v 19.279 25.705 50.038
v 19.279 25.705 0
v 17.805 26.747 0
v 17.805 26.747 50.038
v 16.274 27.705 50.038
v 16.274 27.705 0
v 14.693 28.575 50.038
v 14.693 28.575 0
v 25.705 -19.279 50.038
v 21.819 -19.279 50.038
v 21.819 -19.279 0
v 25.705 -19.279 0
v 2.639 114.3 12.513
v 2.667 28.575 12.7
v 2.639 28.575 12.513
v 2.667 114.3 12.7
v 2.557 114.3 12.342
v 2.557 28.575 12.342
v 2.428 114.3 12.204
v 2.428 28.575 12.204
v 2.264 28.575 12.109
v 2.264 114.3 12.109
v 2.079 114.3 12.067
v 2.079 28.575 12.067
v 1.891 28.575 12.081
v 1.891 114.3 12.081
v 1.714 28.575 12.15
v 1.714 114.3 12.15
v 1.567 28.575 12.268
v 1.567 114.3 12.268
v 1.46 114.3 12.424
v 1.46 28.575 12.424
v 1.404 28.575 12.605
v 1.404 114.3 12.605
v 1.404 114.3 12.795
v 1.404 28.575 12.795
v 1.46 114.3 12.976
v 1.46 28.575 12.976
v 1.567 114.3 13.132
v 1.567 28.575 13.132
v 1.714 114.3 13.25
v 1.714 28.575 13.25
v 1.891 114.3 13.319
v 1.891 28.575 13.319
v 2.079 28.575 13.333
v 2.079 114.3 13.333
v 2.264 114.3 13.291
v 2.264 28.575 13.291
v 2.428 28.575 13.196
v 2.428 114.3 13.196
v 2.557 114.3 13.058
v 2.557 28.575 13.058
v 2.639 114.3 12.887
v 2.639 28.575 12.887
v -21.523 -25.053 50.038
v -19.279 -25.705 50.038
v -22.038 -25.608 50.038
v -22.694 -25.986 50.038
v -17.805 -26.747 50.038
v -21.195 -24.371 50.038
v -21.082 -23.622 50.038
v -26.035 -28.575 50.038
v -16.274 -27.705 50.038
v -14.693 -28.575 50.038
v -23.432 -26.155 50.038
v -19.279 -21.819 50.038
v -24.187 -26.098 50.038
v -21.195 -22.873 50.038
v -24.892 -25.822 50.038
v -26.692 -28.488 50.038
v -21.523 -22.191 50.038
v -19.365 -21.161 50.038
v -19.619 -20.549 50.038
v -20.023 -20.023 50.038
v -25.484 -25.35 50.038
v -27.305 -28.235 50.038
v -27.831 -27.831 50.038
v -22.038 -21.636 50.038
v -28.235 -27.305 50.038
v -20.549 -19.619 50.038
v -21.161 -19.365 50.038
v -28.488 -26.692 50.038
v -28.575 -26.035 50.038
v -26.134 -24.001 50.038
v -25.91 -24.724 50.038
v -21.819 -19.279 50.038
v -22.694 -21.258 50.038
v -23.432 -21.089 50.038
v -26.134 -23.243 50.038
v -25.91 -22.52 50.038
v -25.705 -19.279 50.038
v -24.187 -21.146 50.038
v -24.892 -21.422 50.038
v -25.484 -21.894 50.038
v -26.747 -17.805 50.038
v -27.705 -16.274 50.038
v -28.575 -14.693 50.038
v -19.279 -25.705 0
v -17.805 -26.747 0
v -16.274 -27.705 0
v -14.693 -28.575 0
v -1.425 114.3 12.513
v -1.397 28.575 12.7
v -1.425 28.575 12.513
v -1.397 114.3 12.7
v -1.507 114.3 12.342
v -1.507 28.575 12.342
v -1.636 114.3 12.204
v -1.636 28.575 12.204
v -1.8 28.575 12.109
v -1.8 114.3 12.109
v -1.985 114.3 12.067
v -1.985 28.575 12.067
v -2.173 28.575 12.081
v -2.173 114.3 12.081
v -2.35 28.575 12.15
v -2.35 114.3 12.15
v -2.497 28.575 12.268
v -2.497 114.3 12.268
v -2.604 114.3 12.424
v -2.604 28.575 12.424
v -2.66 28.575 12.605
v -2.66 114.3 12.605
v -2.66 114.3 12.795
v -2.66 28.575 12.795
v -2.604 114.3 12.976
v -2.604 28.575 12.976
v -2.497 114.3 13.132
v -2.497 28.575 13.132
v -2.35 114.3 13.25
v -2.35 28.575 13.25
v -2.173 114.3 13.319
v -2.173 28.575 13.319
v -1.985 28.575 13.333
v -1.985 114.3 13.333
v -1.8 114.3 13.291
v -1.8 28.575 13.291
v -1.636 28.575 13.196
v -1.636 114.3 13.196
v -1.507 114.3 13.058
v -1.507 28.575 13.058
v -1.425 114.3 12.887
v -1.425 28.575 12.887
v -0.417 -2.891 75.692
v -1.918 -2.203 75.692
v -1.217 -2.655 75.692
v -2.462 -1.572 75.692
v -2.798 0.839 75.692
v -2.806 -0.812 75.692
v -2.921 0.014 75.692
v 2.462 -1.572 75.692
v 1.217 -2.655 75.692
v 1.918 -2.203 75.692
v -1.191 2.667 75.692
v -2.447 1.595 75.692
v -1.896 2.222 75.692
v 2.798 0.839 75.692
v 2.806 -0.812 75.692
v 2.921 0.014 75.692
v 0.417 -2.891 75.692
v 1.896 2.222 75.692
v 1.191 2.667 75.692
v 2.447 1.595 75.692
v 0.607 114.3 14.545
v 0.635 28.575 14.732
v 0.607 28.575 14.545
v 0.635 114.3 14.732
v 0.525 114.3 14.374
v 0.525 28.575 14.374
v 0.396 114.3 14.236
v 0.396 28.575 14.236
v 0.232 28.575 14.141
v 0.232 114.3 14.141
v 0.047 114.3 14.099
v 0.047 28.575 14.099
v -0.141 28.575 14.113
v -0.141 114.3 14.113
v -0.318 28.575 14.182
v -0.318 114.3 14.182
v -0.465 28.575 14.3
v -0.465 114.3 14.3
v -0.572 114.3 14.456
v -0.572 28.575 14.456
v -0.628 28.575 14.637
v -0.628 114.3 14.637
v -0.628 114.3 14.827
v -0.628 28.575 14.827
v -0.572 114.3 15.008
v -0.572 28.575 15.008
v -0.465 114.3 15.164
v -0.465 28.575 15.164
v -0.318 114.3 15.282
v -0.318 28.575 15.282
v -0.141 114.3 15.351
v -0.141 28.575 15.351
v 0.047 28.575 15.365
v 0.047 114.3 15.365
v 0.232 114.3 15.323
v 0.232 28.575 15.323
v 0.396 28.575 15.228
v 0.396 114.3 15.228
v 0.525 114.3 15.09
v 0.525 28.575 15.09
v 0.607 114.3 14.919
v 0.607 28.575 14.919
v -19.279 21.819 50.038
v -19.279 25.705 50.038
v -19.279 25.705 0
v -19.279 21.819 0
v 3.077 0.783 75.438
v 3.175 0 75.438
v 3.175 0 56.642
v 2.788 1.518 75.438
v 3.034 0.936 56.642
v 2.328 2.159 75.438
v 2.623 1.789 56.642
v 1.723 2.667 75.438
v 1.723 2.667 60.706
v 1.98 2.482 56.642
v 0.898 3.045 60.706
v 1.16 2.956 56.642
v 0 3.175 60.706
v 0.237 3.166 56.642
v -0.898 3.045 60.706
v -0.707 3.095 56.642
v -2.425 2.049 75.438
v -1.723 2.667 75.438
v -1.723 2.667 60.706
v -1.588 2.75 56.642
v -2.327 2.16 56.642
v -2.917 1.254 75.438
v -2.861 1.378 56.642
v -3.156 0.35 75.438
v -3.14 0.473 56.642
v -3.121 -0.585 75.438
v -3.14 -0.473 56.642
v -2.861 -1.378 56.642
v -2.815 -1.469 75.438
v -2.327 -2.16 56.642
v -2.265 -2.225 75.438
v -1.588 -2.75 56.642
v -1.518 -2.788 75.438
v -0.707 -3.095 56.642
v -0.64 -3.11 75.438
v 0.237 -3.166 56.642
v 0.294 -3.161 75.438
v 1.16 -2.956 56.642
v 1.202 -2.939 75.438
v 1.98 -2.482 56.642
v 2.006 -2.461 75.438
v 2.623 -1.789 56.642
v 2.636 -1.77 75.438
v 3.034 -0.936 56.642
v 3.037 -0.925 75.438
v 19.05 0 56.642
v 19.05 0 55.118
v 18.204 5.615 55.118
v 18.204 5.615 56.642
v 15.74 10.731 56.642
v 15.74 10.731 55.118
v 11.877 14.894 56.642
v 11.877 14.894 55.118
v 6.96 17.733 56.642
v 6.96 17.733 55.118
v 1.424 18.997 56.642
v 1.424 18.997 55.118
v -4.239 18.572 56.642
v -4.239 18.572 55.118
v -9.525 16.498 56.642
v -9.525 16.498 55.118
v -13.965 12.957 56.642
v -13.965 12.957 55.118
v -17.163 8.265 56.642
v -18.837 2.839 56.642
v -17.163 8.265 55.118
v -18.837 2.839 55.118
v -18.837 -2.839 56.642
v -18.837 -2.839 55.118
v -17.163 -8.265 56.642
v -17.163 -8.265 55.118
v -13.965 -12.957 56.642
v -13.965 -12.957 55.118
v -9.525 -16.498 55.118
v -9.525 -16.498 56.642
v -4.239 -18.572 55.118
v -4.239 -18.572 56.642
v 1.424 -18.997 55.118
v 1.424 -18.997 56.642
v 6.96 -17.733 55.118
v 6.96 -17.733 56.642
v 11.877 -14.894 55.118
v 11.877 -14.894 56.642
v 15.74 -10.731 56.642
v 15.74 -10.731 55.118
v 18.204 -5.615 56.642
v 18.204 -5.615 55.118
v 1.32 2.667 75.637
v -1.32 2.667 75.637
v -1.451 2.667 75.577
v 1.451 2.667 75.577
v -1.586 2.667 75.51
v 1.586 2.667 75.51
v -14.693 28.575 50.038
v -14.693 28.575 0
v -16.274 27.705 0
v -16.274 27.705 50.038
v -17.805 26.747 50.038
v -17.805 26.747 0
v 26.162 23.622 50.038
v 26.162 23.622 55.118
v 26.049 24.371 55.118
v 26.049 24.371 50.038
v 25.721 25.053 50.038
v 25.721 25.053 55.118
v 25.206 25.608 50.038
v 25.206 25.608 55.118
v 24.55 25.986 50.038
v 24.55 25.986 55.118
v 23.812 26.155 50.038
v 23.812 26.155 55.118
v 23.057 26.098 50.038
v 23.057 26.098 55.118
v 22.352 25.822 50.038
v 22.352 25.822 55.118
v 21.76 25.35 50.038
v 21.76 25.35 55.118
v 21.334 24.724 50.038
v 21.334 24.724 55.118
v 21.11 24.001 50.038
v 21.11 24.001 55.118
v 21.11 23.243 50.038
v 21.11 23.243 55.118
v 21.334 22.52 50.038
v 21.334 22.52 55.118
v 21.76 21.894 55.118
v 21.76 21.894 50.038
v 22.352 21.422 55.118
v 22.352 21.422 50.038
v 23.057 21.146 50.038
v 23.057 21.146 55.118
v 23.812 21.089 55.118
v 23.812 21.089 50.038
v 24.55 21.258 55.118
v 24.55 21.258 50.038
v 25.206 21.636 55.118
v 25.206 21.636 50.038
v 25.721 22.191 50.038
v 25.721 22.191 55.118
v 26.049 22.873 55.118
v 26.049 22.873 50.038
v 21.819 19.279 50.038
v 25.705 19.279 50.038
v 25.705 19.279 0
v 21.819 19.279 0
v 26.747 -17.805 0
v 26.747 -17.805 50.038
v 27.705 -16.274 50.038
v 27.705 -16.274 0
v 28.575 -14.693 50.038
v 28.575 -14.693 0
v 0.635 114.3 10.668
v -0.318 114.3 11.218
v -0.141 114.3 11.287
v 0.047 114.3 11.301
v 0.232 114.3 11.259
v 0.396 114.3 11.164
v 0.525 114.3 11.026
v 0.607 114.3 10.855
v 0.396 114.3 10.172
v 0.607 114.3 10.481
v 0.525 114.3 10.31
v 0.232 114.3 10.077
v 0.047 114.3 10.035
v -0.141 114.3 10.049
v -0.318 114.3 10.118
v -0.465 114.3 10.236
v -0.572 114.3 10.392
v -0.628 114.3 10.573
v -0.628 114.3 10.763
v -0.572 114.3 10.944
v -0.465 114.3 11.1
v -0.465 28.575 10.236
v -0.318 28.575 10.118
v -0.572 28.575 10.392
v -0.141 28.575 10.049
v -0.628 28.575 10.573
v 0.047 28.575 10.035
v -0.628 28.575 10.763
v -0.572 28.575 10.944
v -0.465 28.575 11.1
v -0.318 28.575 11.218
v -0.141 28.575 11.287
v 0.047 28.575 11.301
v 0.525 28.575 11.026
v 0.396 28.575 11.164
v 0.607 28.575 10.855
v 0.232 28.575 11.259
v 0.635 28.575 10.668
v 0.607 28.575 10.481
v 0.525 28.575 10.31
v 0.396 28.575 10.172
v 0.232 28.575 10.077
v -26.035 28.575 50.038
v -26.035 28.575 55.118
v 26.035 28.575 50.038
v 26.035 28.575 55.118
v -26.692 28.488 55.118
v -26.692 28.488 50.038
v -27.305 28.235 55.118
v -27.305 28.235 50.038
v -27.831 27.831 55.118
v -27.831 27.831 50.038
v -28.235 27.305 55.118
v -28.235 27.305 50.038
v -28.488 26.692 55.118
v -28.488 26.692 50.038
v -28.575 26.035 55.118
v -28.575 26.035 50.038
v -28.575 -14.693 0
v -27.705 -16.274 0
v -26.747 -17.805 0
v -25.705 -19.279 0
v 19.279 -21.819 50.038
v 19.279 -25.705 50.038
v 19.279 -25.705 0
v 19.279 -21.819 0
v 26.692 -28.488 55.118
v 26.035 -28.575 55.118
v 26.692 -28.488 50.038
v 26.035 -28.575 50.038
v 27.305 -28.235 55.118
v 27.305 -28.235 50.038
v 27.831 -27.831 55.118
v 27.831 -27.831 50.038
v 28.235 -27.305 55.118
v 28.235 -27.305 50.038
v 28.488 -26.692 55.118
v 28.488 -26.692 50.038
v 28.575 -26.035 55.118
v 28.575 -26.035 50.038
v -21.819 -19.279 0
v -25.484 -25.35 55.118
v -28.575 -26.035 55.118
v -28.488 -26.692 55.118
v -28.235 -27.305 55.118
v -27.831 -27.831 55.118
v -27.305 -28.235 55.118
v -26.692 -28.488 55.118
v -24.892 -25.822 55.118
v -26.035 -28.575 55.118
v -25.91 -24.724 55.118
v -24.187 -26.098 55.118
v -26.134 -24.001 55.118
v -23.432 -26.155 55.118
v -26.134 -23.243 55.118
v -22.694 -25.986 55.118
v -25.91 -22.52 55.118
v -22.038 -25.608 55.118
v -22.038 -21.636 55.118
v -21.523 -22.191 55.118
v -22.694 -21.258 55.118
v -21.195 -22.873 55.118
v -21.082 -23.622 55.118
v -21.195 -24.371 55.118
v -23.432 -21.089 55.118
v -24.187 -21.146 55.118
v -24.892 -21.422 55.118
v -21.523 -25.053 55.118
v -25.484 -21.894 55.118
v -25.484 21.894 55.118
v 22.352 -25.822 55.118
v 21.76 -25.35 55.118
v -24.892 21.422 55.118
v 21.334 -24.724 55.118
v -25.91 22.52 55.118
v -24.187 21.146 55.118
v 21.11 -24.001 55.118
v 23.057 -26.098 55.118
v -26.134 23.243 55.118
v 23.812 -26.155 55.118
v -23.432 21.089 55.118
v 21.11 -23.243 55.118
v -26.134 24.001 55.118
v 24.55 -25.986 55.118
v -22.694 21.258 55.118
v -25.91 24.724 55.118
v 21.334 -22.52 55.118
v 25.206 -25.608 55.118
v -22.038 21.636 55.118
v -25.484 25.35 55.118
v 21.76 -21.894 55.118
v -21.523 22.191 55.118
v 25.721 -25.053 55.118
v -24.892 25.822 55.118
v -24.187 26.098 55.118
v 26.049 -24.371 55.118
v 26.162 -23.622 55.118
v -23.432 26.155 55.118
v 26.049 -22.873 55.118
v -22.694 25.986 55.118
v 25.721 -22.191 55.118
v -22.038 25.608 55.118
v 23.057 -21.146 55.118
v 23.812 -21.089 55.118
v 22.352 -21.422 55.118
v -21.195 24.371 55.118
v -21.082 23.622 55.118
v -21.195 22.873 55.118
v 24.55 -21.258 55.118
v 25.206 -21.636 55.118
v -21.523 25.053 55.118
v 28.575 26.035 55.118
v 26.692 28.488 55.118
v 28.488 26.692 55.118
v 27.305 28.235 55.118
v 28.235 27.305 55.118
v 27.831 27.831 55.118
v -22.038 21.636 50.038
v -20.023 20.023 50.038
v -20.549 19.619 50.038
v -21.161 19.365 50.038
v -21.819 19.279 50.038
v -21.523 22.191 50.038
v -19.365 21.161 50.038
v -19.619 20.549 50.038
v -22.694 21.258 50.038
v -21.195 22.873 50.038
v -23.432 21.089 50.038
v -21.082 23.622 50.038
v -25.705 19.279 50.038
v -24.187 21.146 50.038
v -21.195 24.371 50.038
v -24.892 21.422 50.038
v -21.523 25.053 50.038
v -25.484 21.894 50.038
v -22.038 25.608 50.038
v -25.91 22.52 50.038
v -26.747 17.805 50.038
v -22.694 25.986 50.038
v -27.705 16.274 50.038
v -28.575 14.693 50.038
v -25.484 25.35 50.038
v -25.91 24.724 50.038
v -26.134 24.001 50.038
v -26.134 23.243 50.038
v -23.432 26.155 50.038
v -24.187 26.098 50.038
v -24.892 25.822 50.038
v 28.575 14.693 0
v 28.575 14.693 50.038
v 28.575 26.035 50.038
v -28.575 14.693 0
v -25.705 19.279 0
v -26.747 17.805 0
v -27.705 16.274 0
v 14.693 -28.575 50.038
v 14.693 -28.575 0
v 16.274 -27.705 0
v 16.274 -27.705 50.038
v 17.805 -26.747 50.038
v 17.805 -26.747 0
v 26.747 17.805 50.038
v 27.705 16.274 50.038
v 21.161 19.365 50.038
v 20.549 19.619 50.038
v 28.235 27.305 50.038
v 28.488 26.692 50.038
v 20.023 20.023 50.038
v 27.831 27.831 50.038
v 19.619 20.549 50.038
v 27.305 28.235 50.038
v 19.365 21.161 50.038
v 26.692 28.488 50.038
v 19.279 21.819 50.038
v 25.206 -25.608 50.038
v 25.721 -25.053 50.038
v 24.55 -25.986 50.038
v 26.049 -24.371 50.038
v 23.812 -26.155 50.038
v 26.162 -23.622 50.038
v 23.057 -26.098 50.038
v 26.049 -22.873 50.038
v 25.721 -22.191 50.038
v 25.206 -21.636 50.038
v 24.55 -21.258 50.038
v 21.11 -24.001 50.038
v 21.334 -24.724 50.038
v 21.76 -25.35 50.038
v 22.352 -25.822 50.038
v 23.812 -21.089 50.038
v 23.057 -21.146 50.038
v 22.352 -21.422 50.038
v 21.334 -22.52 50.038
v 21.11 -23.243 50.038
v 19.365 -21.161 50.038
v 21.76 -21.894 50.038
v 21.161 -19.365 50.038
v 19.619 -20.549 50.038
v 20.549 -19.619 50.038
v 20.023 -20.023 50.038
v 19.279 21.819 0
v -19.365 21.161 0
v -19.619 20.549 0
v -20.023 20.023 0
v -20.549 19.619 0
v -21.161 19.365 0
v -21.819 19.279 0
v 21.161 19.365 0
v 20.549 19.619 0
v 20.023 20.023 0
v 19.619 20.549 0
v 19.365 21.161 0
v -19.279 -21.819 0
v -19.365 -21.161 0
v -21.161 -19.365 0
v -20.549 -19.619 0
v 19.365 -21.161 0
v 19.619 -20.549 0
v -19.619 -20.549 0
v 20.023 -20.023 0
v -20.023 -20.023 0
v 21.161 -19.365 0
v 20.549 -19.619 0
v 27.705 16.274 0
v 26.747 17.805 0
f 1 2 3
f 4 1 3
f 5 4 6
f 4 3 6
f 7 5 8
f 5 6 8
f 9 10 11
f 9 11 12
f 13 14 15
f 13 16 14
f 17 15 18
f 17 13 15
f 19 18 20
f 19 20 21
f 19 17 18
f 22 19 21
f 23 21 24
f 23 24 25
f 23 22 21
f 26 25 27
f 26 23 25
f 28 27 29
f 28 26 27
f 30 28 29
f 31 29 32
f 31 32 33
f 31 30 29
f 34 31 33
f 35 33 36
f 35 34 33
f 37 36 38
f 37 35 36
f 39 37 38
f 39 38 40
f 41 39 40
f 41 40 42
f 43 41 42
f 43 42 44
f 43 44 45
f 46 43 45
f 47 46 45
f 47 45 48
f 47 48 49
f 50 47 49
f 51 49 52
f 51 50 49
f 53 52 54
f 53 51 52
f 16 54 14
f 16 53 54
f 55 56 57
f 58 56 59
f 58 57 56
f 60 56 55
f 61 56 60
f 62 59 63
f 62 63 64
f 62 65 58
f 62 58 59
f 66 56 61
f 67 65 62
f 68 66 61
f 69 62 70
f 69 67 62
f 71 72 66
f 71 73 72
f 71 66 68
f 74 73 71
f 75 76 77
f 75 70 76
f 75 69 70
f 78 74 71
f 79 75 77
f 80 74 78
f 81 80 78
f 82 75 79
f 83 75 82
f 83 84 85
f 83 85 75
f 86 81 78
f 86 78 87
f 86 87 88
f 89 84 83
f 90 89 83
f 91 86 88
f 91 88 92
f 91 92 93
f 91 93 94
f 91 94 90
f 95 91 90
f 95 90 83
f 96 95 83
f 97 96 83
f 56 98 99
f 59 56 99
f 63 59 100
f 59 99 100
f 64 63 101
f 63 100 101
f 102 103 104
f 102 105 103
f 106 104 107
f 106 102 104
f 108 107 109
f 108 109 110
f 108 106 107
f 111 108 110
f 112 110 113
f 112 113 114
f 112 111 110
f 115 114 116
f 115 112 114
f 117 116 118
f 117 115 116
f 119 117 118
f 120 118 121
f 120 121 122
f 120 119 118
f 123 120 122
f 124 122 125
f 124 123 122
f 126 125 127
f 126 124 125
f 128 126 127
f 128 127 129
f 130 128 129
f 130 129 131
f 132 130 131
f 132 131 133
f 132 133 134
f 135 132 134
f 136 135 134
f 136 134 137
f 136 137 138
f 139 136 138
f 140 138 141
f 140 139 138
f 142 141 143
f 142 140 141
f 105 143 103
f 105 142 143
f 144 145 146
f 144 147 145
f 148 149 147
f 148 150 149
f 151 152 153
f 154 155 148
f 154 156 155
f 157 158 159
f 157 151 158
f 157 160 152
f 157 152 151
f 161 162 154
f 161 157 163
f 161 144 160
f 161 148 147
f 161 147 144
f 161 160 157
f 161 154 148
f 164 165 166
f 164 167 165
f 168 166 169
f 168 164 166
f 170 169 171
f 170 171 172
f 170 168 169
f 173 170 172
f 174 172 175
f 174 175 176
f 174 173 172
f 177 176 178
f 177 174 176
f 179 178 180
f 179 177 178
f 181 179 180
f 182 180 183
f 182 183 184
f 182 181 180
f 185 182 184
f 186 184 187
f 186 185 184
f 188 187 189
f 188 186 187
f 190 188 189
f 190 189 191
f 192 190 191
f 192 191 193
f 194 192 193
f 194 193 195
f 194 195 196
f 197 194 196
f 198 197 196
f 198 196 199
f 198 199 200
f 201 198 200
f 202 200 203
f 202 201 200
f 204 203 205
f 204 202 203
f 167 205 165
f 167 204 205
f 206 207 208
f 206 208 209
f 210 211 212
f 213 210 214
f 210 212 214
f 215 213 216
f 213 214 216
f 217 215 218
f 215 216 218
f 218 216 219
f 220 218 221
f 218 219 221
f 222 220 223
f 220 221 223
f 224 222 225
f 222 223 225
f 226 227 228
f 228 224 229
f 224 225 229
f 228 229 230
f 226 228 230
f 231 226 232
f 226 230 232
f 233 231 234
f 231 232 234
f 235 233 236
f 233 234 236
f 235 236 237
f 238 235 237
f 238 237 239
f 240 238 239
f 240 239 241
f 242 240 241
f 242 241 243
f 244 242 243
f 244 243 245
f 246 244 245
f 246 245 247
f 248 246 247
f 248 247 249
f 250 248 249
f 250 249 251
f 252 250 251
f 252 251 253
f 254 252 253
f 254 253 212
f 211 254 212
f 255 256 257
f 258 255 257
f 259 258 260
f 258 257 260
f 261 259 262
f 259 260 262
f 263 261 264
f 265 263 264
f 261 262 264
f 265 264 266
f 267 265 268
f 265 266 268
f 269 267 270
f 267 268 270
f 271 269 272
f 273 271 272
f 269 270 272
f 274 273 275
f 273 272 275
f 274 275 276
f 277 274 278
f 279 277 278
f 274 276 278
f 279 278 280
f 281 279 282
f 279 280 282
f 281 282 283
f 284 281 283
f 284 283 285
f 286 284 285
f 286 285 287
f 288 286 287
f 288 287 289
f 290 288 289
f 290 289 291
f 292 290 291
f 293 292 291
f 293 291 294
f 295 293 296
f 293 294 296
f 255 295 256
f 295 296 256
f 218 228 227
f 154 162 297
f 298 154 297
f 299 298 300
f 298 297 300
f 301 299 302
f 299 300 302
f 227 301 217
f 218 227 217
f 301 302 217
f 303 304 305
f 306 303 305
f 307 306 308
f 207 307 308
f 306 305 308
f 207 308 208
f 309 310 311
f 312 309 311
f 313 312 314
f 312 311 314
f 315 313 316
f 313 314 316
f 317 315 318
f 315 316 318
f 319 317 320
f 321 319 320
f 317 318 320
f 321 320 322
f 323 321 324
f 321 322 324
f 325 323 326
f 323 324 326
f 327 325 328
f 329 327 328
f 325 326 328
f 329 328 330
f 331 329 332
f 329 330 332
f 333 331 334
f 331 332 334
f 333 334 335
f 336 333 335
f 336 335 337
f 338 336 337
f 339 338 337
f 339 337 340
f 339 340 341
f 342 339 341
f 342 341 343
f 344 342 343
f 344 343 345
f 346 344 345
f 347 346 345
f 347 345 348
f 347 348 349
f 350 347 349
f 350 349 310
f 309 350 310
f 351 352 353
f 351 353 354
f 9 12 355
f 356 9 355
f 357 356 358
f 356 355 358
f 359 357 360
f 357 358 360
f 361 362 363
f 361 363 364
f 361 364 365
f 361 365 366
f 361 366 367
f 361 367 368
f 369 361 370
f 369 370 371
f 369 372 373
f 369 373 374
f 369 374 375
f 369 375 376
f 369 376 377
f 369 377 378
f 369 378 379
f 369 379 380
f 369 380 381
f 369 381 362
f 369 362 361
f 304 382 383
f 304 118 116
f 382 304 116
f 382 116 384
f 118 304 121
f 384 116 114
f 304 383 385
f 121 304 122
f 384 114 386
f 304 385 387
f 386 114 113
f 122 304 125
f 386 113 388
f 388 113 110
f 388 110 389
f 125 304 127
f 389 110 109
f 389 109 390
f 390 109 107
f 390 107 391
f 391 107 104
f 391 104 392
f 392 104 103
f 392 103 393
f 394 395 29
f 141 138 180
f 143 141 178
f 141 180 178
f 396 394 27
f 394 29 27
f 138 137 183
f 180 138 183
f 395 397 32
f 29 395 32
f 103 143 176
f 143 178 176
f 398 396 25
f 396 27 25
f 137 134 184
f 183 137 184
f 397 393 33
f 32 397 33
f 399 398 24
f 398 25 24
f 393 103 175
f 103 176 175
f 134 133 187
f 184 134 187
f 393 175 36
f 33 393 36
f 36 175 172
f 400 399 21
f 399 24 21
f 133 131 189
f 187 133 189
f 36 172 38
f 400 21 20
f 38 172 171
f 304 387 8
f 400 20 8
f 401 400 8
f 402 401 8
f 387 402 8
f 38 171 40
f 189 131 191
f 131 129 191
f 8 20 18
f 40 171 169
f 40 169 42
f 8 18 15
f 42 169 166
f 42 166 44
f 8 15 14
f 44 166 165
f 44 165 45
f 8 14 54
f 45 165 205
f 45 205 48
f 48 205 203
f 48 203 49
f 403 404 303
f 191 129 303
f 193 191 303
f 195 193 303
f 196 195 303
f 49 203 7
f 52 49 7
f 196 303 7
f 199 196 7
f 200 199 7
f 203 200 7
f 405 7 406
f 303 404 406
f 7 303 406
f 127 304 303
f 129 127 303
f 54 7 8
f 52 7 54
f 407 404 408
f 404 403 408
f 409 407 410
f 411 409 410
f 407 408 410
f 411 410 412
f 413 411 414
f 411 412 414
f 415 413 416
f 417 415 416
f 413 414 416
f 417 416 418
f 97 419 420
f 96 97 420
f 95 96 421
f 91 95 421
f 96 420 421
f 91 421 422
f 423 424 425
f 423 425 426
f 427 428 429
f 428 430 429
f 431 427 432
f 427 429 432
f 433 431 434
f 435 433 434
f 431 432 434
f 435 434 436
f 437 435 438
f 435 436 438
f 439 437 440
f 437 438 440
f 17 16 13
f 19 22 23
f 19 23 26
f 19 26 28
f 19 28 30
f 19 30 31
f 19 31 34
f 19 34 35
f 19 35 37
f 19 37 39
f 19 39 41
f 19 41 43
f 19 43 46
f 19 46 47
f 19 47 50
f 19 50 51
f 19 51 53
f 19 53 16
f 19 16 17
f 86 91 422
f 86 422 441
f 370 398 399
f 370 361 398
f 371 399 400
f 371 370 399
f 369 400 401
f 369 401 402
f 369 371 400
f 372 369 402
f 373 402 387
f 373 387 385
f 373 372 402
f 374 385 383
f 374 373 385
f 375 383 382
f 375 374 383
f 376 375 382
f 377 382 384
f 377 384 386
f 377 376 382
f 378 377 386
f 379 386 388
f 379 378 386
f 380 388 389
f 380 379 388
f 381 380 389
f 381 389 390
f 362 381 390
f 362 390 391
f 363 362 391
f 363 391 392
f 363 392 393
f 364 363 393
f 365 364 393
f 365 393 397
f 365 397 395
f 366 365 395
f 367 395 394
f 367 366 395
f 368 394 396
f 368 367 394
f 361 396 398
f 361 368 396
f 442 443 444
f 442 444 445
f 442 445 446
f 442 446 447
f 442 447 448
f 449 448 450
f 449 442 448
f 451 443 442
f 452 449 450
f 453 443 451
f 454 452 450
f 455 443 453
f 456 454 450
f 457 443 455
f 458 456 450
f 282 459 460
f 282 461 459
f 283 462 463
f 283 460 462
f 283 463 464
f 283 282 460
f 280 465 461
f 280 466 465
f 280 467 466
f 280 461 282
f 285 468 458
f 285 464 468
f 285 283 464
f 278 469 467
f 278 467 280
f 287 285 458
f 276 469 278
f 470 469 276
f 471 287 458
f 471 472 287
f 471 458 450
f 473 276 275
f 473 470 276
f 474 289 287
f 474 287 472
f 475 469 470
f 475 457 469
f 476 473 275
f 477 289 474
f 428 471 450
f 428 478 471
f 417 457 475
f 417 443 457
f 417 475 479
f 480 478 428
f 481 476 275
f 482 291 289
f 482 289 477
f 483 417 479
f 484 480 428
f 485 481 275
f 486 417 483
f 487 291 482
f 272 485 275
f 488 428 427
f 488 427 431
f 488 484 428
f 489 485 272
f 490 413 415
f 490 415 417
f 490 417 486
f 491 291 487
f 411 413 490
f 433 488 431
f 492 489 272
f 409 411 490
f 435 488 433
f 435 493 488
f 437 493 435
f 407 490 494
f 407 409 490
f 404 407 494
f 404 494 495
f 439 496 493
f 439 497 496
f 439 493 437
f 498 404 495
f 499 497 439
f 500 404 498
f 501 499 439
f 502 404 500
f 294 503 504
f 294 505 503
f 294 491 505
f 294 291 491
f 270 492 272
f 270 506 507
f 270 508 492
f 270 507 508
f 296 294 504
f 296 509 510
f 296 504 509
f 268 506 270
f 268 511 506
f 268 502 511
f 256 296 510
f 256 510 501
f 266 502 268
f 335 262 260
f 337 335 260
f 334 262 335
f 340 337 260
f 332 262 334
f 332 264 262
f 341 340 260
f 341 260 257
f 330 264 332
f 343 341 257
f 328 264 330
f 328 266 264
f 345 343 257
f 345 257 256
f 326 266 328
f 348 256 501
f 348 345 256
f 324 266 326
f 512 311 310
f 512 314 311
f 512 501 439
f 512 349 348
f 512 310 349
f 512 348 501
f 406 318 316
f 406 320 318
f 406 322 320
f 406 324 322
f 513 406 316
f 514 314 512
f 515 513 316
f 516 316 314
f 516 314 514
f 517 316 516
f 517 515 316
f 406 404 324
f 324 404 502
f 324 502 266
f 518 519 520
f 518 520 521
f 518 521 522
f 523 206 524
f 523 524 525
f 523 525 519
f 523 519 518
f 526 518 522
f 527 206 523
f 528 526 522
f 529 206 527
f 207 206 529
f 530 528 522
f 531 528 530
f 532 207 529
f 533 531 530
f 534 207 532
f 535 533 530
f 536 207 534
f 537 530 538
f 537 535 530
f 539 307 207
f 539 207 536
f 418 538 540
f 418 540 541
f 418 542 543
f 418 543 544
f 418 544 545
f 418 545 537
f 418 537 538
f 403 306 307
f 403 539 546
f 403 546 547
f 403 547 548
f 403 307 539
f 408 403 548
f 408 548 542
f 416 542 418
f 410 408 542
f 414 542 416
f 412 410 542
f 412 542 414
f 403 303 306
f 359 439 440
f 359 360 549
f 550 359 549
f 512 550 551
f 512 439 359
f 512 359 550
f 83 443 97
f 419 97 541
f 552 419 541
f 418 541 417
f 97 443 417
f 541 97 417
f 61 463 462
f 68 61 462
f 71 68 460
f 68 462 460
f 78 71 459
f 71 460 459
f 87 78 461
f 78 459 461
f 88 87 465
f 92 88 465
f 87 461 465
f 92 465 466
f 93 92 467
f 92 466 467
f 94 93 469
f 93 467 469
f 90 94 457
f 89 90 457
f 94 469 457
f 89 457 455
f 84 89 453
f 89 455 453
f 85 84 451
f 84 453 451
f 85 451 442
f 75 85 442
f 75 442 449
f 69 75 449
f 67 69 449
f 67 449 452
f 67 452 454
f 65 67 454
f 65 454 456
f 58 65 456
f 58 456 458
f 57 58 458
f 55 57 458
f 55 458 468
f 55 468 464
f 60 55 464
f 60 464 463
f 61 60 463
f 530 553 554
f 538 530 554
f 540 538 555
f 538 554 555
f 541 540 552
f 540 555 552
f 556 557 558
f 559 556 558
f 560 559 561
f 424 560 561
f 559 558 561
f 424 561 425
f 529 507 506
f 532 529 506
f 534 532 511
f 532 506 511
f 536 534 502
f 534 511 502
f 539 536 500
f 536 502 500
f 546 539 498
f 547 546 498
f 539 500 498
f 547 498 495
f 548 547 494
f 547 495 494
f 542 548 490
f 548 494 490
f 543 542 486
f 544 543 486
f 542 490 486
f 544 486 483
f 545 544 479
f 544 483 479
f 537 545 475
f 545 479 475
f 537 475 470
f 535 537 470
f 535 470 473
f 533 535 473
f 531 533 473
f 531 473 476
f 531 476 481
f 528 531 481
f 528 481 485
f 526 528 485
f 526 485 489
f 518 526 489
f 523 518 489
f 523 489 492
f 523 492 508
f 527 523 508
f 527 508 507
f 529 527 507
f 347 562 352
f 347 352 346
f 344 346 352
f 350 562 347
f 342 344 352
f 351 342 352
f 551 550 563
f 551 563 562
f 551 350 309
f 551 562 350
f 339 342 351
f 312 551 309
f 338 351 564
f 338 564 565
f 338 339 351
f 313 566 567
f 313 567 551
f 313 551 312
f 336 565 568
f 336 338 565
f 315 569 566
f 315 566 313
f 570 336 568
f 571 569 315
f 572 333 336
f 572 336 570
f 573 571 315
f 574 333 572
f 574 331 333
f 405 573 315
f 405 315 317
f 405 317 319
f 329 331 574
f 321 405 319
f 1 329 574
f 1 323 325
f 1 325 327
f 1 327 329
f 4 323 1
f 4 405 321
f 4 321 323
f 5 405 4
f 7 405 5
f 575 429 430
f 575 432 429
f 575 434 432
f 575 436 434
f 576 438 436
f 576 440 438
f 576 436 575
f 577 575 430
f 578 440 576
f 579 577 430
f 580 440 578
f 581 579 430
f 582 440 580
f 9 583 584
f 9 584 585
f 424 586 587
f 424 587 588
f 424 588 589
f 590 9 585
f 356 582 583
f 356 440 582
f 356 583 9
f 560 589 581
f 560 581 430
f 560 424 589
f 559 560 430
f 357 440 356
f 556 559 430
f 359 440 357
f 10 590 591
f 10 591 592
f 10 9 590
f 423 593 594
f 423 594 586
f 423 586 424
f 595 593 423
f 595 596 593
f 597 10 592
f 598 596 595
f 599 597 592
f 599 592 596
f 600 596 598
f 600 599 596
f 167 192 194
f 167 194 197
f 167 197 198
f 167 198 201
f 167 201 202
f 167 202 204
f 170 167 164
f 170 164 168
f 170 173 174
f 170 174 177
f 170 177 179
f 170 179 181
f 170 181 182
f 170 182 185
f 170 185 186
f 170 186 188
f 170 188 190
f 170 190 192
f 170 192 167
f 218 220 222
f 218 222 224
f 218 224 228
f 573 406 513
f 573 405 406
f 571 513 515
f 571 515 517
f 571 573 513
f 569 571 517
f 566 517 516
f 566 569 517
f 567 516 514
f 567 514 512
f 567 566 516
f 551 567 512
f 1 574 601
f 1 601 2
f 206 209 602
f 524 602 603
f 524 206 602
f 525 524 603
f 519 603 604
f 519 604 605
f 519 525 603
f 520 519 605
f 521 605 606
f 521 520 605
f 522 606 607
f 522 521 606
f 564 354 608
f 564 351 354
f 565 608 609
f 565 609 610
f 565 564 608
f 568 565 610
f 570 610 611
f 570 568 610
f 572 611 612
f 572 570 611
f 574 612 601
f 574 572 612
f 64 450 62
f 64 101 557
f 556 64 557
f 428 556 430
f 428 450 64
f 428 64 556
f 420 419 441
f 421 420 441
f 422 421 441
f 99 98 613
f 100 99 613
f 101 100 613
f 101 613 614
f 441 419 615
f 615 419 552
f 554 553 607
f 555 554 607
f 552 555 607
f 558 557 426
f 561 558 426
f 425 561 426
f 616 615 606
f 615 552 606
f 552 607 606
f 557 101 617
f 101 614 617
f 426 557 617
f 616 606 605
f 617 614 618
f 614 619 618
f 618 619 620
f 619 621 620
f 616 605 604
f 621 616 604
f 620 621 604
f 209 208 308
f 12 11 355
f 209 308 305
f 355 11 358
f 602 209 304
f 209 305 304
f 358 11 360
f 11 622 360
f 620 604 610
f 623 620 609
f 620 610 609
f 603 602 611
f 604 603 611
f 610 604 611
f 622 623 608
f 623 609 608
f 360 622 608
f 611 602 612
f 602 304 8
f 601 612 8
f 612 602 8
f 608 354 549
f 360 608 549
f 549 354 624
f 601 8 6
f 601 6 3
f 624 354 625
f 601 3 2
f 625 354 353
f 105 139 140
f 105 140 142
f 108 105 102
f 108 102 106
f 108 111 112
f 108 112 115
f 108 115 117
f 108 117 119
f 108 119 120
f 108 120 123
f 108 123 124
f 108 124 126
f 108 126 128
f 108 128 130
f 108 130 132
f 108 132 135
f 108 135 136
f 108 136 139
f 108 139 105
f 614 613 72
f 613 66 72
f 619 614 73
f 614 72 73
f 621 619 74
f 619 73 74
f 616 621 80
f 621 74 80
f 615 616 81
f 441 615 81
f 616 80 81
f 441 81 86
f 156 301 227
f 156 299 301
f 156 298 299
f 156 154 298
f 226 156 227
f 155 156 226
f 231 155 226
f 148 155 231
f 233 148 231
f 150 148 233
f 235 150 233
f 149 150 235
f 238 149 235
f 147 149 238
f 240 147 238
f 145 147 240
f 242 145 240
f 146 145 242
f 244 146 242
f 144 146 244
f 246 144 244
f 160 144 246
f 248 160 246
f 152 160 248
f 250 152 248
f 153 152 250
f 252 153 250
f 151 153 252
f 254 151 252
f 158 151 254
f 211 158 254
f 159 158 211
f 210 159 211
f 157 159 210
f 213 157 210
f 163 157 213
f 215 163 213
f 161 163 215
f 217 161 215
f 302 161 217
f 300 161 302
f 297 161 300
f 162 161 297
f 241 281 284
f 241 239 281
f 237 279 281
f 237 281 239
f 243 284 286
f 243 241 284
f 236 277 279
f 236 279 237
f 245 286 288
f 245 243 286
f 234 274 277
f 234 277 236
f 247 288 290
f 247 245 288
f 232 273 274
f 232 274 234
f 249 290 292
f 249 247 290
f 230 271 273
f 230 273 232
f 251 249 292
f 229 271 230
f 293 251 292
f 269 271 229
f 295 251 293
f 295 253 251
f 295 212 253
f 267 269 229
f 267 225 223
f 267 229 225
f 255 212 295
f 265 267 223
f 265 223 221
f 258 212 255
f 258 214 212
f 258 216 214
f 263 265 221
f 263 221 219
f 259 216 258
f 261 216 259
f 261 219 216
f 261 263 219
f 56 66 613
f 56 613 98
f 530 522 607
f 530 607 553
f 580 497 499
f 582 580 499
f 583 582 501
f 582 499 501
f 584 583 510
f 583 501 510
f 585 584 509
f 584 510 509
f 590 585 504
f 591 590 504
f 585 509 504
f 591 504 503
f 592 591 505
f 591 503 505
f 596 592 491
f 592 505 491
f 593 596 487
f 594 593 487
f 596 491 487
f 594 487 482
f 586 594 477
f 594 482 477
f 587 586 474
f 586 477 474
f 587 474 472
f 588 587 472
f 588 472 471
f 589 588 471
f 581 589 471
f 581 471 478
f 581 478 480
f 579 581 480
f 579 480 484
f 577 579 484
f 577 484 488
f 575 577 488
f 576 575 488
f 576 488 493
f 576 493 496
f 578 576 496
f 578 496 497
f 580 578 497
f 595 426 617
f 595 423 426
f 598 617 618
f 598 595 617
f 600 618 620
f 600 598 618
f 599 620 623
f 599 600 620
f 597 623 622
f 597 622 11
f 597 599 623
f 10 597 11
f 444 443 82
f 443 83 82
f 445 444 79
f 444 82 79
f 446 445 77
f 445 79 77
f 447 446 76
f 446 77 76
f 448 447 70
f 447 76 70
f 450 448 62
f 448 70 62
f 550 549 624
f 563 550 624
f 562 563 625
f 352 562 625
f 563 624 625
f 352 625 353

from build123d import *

# Parameters (mm, degrees)
SKETCH1_W           = 57.15
SKETCH1_H           = 57.15
BOSS_EXTRUDE1_DEPTH = 55.118
CUT_EXTRUDE1_DEPTH  = 50.038
CUT_EXTRUDE2_DEPTH  = 50.038
CUT_EXTRUDE3_DEPTH  = 50.038
CUT_EXTRUDE4_DEPTH  = 50.038
CUT_EXTRUDE5_DEPTH  = 50.038
CUT_EXTRUDE6_DEPTH  = 50.038
CUT_EXTRUDE7_DEPTH  = 50.038
CUT_EXTRUDE8_DEPTH  = 50.038
SKETCH10_R          = 19.05
BOSS_EXTRUDE2_DEPTH = 1.524
SKETCH11_R          = 3.175
BOSS_EXTRUDE3_DEPTH = 19.05
CUT_EXTRUDE9_DEPTH  = 14.986
SKETCH13_W          = 0.635
SKETCH13_H          = 85.725
SKETCH14_W          = 0.635
SKETCH14_H          = 85.725
SKETCH15_W          = 0.635
SKETCH15_H          = 85.725
SKETCH16_W          = 0.635
SKETCH16_H          = 85.725
HOLE1_D             = 5.08
HOLE1_DEPTH         = 25.654
HOLE2_D             = 5.08
HOLE2_DEPTH         = 25.654
HOLE3_D             = 5.08
HOLE3_DEPTH         = 25.654
HOLE4_D             = 5.08
HOLE4_DEPTH         = 25.654
CHAMFER1_SIZE       = 0.254
FILLET1_R           = 2.54
FILLET2_R           = 2.54
FILLET3_R           = 2.54
FILLET4_R           = 2.54
FILLET5_R           = 2.54
FILLET6_R           = 2.54
FILLET7_R           = 2.54
FILLET8_R           = 2.54


with BuildPart() as part:
    # Sketch1 → Boss-Extrude1 (new body)
    with BuildSketch(Plane.XY.offset(55.118)):
        Rectangle(SKETCH1_W, SKETCH1_H)
    extrude(amount=-BOSS_EXTRUDE1_DEPTH)

    # Sketch2 → Cut-Extrude1 (cut)
    with BuildSketch(Plane(origin=(0, 0, 0), x_dir=(-1, 0, 0), z_dir=(0, 0, -1))):
        with BuildLine():
            Line((-28.575, -28.575), (-14.692533342, -28.575))
            ThreePointArc((-14.692533342, -28.575), (-22.720047986, -22.720047986), (-28.575, -14.692533342))
            Line((-28.575, -14.692533342), (-28.575, -28.575))
        make_face()
    extrude(amount=-CUT_EXTRUDE1_DEPTH, mode=Mode.SUBTRACT)

    # Sketch3 → Cut-Extrude2 (cut)
    with BuildSketch(Plane(origin=(0, 0, 0), x_dir=(-1, 0, 0), z_dir=(0, 0, -1))):
        with BuildLine():
            Line((-19.2786, -25.7048), (-19.2786, -19.2786))
            Line((-19.2786, -19.2786), (-25.7048, -19.2786))
            ThreePointArc((-25.7048, -19.2786), (-22.720047986, -22.720047986), (-19.2786, -25.7048))
        make_face()
    extrude(amount=-CUT_EXTRUDE2_DEPTH, mode=Mode.SUBTRACT)

    # Sketch4 → Cut-Extrude3 (cut)
    with BuildSketch(Plane(origin=(0, 0, 0), x_dir=(-1, 0, 0), z_dir=(0, 0, -1))):
        with BuildLine():
            Line((-28.575, 28.575), (-28.575, 14.692533342))
            ThreePointArc((-28.575, 14.692533342), (-22.720047986, 22.720047986), (-14.692533342, 28.575))
            Line((-14.692533342, 28.575), (-28.575, 28.575))
        make_face()
    extrude(amount=-CUT_EXTRUDE3_DEPTH, mode=Mode.SUBTRACT)

    # Sketch5 → Cut-Extrude4 (cut)
    with BuildSketch(Plane(origin=(0, 0, 0), x_dir=(-1, 0, 0), z_dir=(0, 0, -1))):
        with BuildLine():
            Line((-25.7048, 19.2786), (-19.2786, 19.2786))
            Line((-19.2786, 19.2786), (-19.2786, 25.7048))
            ThreePointArc((-19.2786, 25.7048), (-22.720047986, 22.720047986), (-25.7048, 19.2786))
        make_face()
    extrude(amount=-CUT_EXTRUDE4_DEPTH, mode=Mode.SUBTRACT)

    # Sketch6 → Cut-Extrude5 (cut)
    with BuildSketch(Plane(origin=(0, 0, 0), x_dir=(-1, 0, 0), z_dir=(0, 0, -1))):
        with BuildLine():
            Line((28.575, 28.575), (14.692533342, 28.575))
            ThreePointArc((14.692533342, 28.575), (22.720047986, 22.720047986), (28.575, 14.692533342))
            Line((28.575, 14.692533342), (28.575, 28.575))
        make_face()
    extrude(amount=-CUT_EXTRUDE5_DEPTH, mode=Mode.SUBTRACT)

    # Sketch7 → Cut-Extrude6 (cut)
    with BuildSketch(Plane(origin=(0, 0, 0), x_dir=(-1, 0, 0), z_dir=(0, 0, -1))):
        with BuildLine():
            Line((19.2786, 25.7048), (19.2786, 19.2786))
            Line((19.2786, 19.2786), (25.7048, 19.2786))
            ThreePointArc((25.7048, 19.2786), (22.720047986, 22.720047986), (19.2786, 25.7048))
        make_face()
    extrude(amount=-CUT_EXTRUDE6_DEPTH, mode=Mode.SUBTRACT)

    # Sketch8 → Cut-Extrude7 (cut)
    with BuildSketch(Plane(origin=(0, 0, 0), x_dir=(-1, 0, 0), z_dir=(0, 0, -1))):
        with BuildLine():
            Line((28.575, -28.575), (28.575, -14.692533342))
            ThreePointArc((28.575, -14.692533342), (22.720047986, -22.720047986), (14.692533342, -28.575))
            Line((14.692533342, -28.575), (28.575, -28.575))
        make_face()
    extrude(amount=-CUT_EXTRUDE7_DEPTH, mode=Mode.SUBTRACT)

    # Sketch9 → Cut-Extrude8 (cut)
    with BuildSketch(Plane(origin=(0, 0, 0), x_dir=(-1, 0, 0), z_dir=(0, 0, -1))):
        with BuildLine():
            Line((25.7048, -19.2786), (19.2786, -19.2786))
            Line((19.2786, -19.2786), (19.2786, -25.7048))
            ThreePointArc((19.2786, -25.7048), (22.720047986, -22.720047986), (25.7048, -19.2786))
        make_face()
    extrude(amount=-CUT_EXTRUDE8_DEPTH, mode=Mode.SUBTRACT)

    # Sketch10 → Boss-Extrude2 (add)
    with BuildSketch(Plane.XY.offset(55.118)):
        Circle(SKETCH10_R)
    extrude(amount=BOSS_EXTRUDE2_DEPTH)

    # Sketch11 → Boss-Extrude3 (add)
    with BuildSketch(Plane.XY.offset(56.642)):
        Circle(SKETCH11_R)
    extrude(amount=BOSS_EXTRUDE3_DEPTH)

    # Sketch12 → Cut-Extrude9 (cut)
    with BuildSketch(Plane.XY.offset(75.692)):
        with BuildLine():
            Line((-1.722711816, 2.667), (1.722711816, 2.667))
            ThreePointArc((1.722711816, 2.667), (0, 3.175), (-1.722711816, 2.667))
        make_face()
    extrude(amount=-CUT_EXTRUDE9_DEPTH, mode=Mode.SUBTRACT)

    # Sketch13 → Revolve1 (revolve)
    with BuildSketch(Plane(origin=(0, 0, 12.7), x_dir=(-1, 0, 0), z_dir=(0, 0, -1))):
        with Locations((1.7145, 71.4375)):
            Rectangle(SKETCH13_W, SKETCH13_H)
    revolve(axis=Axis((-2.032, 28.575, 12.7), (0, 1, 0)))

    # Sketch14 → Revolve2 (revolve)
    with BuildSketch(Plane(origin=(0, 0, 12.7), x_dir=(-1, 0, 0), z_dir=(0, 0, -1))):
        with Locations((-2.3495, 71.4375)):
            Rectangle(SKETCH14_W, SKETCH14_H)
    revolve(axis=Axis((2.032, 28.575, 12.7), (0, 1, 0)))

    # Sketch15 → Revolve3 (revolve)
    with BuildSketch(Plane(origin=(0, 0, 14.732), x_dir=(-1, 0, 0), z_dir=(0, 0, -1))):
        with Locations((-0.3175, 71.4375)):
            Rectangle(SKETCH15_W, SKETCH15_H)
    revolve(axis=Axis((0, 28.575, 14.732), (0, 1, 0)))

    # Sketch16 → Revolve4 (revolve)
    with BuildSketch(Plane(origin=(0, 0, 10.668), x_dir=(-1, 0, 0), z_dir=(0, 0, -1))):
        with Locations((-0.3175, 71.4375)):
            Rectangle(SKETCH16_W, SKETCH16_H)
    revolve(axis=Axis((0, 28.575, 10.668), (0, 1, 0)))

    # Hole1
    with Locations(Plane(origin=(0, 0, 50.038), x_dir=(-1, 0, 0), z_dir=(0, 0, -1))):
        with Locations((23.622, -23.622)):
            Hole(HOLE1_D / 2, depth=HOLE1_DEPTH)

    # Hole2
    with Locations(Plane(origin=(0, 0, 50.038), x_dir=(-1, 0, 0), z_dir=(0, 0, -1))):
        with Locations((23.622, 23.622)):
            Hole(HOLE2_D / 2, depth=HOLE2_DEPTH)

    # Hole3
    with Locations(Plane(origin=(0, 0, 50.038), x_dir=(-1, 0, 0), z_dir=(0, 0, -1))):
        with Locations((-23.622, 23.622)):
            Hole(HOLE3_D / 2, depth=HOLE3_DEPTH)

    # Hole4
    with Locations(Plane(origin=(0, 0, 50.038), x_dir=(-1, 0, 0), z_dir=(0, 0, -1))):
        with Locations((-23.622, -23.622)):
            Hole(HOLE4_D / 2, depth=HOLE4_DEPTH)

    # Chamfer1
    chamfer1_edges = [part.edges().sort_by_distance(p)[0] for p in [
        (-1.51838977, -2.78838977, 75.692),
    ]]
    chamfer(chamfer1_edges, length=CHAMFER1_SIZE)

    # Fillet1
    fillet1_edges = [part.edges().sort_by_distance(p)[0] for p in [
        (-28.575, 28.575, 52.578),
    ]]
    fillet(fillet1_edges, radius=FILLET1_R)

    # Fillet2
    fillet2_edges = [part.edges().sort_by_distance(p)[0] for p in [
        (-28.575, -28.575, 52.578),
    ]]
    fillet(fillet2_edges, radius=FILLET2_R)

    # Fillet3
    fillet3_edges = [part.edges().sort_by_distance(p)[0] for p in [
        (28.575, 28.575, 52.578),
    ]]
    fillet(fillet3_edges, radius=FILLET3_R)

    # Fillet4
    fillet4_edges = [part.edges().sort_by_distance(p)[0] for p in [
        (-19.2786, 19.2786, 25.019),
    ]]
    fillet(fillet4_edges, radius=FILLET4_R)

    # Fillet5
    fillet5_edges = [part.edges().sort_by_distance(p)[0] for p in [
        (28.575, -28.575, 52.578),
    ]]
    fillet(fillet5_edges, radius=FILLET5_R)

    # Fillet6
    fillet6_edges = [part.edges().sort_by_distance(p)[0] for p in [
        (19.2786, -19.2786, 25.019),
    ]]
    fillet(fillet6_edges, radius=FILLET6_R)

    # Fillet7
    fillet7_edges = [part.edges().sort_by_distance(p)[0] for p in [
        (19.2786, 19.2786, 25.019),
    ]]
    fillet(fillet7_edges, radius=FILLET7_R)

    # Fillet8
    fillet8_edges = [part.edges().sort_by_distance(p)[0] for p in [
        (-19.2786, -19.2786, 25.019),
    ]]
    fillet(fillet8_edges, radius=FILLET8_R)


solid = part.part
